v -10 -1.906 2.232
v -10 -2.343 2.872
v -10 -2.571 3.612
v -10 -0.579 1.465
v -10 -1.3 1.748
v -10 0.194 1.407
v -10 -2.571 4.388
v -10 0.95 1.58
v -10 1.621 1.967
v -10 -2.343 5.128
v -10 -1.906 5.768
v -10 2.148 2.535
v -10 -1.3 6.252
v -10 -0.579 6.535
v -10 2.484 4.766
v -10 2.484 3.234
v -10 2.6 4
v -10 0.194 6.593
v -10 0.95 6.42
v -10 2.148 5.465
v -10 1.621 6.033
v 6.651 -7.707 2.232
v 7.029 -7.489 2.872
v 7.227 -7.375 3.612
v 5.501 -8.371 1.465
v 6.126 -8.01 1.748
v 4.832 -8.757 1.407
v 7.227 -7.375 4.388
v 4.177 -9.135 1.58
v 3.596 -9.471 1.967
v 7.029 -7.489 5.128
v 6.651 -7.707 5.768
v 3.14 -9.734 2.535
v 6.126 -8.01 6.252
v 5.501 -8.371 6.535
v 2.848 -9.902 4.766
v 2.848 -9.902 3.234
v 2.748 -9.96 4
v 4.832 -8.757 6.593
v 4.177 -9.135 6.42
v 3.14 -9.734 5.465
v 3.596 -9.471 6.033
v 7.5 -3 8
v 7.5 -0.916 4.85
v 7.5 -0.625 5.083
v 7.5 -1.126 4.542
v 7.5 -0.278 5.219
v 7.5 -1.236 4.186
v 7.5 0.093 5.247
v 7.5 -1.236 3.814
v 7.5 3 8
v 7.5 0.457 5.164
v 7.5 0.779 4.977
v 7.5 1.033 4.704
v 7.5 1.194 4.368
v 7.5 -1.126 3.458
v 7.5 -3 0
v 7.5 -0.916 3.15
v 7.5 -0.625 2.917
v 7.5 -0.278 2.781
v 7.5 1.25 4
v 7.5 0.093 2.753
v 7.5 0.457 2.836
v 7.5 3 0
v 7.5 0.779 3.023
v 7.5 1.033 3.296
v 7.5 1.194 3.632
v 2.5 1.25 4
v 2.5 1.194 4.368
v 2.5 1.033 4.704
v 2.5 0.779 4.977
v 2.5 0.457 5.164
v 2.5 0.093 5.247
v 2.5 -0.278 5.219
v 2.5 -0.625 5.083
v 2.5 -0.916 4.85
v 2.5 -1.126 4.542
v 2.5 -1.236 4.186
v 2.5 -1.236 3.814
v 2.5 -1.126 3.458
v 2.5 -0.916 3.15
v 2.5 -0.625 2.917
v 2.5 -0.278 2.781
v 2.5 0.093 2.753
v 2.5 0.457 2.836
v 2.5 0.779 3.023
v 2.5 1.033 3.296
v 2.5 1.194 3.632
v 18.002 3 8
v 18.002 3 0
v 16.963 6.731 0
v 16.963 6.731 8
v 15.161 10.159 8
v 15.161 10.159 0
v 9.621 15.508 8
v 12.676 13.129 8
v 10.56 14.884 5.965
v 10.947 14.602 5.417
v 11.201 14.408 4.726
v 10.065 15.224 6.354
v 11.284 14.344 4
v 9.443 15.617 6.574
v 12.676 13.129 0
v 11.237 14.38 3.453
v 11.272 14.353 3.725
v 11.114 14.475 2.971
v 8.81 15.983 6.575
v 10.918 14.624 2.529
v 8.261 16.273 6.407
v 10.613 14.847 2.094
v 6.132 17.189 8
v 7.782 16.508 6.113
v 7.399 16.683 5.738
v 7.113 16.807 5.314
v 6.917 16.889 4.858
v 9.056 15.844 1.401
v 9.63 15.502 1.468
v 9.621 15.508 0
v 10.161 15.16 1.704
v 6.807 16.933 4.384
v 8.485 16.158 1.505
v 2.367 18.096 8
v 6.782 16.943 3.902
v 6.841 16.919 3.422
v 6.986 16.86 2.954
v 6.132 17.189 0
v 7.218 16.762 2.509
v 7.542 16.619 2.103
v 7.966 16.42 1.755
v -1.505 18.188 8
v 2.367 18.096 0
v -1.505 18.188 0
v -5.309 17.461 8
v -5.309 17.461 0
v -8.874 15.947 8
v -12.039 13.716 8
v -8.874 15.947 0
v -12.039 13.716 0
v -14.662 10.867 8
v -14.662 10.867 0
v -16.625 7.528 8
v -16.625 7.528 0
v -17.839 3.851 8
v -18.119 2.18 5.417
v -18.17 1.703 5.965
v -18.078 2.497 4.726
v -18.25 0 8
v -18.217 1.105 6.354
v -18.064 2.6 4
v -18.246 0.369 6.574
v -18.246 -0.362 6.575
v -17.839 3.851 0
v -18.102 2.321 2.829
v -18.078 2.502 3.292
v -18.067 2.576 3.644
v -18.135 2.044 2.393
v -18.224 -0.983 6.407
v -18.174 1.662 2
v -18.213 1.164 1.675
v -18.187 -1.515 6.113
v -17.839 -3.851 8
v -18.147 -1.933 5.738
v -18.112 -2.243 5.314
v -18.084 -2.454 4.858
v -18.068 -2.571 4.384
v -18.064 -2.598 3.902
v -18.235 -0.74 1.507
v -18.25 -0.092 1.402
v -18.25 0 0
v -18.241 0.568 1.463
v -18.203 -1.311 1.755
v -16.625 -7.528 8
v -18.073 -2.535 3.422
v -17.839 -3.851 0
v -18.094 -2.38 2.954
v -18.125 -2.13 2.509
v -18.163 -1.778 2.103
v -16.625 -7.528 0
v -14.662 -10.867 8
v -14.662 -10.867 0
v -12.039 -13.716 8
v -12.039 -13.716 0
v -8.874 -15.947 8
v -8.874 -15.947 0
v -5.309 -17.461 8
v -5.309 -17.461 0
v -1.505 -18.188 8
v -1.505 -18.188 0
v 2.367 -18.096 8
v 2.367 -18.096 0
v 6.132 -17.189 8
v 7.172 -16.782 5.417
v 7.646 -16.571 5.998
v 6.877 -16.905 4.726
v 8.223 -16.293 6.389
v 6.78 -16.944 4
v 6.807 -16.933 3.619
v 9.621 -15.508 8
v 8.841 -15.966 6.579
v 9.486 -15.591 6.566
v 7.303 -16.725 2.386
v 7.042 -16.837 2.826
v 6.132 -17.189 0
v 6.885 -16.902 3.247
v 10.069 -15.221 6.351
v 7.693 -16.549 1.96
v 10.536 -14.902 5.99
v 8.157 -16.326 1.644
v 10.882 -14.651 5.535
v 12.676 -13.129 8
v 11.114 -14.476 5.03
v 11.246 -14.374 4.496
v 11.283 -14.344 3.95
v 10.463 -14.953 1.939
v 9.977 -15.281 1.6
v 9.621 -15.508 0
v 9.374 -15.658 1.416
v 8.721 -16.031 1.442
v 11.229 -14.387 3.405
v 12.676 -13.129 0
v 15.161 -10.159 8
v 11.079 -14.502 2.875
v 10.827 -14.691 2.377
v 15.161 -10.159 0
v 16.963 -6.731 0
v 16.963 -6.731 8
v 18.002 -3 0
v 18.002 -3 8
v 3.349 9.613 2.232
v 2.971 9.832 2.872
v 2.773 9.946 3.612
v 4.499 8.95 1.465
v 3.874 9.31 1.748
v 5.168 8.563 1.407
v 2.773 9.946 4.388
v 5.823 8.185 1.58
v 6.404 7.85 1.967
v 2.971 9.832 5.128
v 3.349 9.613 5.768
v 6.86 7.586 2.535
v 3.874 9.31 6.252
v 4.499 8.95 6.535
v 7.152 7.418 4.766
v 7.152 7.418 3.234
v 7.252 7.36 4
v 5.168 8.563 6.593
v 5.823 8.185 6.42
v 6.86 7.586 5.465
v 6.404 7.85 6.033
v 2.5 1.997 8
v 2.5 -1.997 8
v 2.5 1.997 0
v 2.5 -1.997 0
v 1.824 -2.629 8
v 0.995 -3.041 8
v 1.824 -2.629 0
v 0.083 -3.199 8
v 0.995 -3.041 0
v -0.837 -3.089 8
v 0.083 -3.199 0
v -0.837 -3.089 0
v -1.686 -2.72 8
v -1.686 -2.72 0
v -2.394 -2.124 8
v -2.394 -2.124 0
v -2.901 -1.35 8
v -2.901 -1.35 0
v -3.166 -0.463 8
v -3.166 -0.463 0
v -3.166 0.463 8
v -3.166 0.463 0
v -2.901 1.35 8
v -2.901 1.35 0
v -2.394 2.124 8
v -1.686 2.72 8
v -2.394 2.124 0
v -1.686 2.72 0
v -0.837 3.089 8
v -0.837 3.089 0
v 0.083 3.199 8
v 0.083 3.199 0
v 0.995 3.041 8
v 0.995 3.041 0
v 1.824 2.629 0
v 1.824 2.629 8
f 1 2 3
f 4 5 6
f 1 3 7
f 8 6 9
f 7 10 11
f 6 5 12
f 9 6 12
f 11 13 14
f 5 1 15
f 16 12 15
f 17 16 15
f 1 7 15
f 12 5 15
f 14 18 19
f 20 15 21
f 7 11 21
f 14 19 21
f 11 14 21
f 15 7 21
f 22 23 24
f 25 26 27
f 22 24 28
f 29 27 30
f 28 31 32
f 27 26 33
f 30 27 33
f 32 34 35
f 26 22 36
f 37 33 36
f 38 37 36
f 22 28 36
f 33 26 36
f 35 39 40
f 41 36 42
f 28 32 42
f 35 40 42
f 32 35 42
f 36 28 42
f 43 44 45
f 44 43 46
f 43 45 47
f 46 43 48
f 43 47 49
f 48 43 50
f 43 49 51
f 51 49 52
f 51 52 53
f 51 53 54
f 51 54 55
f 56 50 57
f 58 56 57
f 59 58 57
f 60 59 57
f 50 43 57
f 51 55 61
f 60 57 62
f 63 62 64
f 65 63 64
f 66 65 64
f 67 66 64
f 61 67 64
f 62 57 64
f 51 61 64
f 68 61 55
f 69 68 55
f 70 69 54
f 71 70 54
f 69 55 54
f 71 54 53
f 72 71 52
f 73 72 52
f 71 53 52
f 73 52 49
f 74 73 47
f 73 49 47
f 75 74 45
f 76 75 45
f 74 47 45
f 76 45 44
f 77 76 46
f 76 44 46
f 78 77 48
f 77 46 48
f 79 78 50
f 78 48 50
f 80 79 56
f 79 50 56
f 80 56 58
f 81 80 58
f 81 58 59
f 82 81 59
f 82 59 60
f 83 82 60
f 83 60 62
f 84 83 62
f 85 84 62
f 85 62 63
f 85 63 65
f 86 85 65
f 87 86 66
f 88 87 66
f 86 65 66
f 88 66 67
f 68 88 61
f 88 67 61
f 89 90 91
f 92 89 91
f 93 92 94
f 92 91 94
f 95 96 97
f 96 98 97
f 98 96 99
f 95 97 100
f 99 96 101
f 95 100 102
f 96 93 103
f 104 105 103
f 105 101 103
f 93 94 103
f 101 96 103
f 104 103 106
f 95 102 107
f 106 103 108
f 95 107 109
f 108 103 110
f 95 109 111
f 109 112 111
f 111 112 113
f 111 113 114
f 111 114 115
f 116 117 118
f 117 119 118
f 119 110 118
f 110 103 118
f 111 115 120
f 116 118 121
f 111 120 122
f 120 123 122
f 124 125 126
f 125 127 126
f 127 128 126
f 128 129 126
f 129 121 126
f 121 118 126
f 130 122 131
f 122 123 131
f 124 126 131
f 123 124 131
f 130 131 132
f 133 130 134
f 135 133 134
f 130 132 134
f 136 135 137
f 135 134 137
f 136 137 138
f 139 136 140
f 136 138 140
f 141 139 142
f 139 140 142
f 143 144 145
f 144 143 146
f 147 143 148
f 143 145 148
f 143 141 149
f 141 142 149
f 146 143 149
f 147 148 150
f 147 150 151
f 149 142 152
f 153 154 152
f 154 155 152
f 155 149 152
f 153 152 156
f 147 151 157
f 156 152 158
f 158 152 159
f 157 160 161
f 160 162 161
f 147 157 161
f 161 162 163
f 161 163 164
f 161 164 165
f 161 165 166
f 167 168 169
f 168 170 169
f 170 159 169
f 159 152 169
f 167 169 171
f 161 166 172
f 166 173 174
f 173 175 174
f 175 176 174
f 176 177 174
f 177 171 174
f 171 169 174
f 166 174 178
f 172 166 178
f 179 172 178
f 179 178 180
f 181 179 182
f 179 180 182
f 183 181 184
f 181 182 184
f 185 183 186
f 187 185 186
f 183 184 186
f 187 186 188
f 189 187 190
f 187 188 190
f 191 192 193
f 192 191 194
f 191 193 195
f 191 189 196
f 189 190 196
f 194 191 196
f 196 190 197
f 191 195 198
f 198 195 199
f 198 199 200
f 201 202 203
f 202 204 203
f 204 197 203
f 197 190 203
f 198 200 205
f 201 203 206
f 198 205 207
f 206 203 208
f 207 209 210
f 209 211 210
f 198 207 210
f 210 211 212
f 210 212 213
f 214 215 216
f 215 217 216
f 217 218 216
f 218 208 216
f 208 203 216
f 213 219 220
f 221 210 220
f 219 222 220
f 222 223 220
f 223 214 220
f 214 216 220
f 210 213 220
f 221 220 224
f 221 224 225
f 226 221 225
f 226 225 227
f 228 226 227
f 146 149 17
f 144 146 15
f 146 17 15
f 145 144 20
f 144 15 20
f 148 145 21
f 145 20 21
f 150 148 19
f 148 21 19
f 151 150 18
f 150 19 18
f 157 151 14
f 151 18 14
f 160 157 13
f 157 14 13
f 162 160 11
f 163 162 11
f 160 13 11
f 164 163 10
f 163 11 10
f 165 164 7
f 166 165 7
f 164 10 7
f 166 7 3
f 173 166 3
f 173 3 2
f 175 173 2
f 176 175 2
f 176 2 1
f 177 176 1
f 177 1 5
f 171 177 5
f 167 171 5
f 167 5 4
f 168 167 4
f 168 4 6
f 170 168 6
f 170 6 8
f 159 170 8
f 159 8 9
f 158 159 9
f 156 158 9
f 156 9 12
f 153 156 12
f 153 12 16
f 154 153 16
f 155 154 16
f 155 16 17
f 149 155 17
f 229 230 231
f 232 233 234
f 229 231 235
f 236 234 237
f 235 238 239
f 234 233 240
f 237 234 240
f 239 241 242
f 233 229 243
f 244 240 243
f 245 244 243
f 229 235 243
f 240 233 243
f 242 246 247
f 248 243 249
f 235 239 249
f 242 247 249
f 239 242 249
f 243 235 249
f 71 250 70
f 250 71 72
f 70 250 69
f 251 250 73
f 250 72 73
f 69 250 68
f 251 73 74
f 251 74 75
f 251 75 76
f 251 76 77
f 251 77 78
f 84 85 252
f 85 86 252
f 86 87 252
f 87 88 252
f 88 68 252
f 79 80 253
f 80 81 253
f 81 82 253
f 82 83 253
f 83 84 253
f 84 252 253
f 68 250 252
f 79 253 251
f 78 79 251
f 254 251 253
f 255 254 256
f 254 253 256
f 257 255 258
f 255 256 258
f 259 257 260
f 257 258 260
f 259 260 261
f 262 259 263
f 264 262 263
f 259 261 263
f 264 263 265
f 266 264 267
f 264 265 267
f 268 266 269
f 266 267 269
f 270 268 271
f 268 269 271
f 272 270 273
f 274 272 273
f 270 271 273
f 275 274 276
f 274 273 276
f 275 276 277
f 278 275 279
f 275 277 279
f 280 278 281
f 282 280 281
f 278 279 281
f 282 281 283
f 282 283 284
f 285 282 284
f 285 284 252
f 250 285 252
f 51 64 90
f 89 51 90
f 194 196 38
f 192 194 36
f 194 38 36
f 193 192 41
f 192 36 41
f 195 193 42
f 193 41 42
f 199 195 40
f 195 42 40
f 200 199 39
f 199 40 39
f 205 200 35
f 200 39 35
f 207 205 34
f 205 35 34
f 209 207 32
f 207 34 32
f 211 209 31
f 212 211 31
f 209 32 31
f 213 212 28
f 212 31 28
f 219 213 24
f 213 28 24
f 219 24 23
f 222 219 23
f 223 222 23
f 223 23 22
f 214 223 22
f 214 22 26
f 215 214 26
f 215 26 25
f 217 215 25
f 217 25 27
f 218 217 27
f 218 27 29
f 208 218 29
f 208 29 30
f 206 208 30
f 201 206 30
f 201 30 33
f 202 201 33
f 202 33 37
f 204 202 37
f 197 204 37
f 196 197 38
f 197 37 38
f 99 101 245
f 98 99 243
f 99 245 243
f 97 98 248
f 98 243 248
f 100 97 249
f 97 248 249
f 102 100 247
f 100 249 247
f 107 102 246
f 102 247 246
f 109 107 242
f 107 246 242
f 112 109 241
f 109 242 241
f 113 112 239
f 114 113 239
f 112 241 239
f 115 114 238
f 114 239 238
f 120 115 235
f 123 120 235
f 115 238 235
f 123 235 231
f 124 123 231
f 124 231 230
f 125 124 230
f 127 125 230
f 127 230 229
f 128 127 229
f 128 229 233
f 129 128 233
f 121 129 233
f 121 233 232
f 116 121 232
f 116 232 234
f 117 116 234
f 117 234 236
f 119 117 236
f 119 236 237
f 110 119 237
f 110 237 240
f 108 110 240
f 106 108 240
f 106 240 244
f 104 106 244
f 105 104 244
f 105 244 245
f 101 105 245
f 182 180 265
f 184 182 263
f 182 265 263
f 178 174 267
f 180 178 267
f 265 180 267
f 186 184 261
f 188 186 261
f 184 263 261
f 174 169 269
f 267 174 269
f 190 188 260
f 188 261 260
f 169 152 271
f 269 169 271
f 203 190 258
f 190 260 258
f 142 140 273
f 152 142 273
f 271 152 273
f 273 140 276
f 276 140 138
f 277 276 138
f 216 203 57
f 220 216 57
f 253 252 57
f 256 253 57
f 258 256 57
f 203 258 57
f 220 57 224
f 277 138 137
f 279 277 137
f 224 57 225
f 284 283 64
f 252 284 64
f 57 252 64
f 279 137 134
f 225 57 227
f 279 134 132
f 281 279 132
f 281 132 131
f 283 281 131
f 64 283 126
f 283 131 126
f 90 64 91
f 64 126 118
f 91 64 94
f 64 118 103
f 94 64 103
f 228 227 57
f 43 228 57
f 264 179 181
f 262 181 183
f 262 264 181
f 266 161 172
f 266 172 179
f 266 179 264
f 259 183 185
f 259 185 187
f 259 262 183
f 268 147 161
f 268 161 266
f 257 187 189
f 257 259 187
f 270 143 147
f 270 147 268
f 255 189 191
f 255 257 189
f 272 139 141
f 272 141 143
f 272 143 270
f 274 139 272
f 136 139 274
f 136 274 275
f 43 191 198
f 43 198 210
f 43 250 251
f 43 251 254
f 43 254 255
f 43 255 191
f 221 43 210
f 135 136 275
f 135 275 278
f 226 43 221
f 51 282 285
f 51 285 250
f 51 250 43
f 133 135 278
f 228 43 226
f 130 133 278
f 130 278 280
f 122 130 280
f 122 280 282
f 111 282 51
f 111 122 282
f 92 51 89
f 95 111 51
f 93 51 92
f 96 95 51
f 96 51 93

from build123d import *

# Parameters (mm, degrees)
F1_DEPTH = 8
F2_R     = 1.25
F3_DEPTH = 5
F5_R     = 2.6
F6_DEPTH = 25
F7_COUNT = 3
F7_ANGLE = 240


with BuildPart() as f1:
    # F0 (on Top) → F1 (new body)
    with BuildSketch(Plane.XY):
        with BuildLine():
            Line((7.5, 3), (18.001736, 3))
            ThreePointArc((18.001736, 3), (-18.25, 0), (18.001736, -3))
            Line((18.001736, -3), (7.5, -3))
            Line((7.5, -3), (7.5, 0))
            Line((7.5, 0), (7.5, 3))
        make_face()
        with BuildLine():
            ThreePointArc((2.5, -1.997498), (-3.2, 0), (2.5, 1.997498))
            Line((2.5, 1.997498), (2.5, -1.997498))
        make_face(mode=Mode.SUBTRACT)
    extrude(amount=F1_DEPTH)

    # F2 (on face) → F3 (cut, through all)
    with BuildSketch(Plane.YZ.offset(7.5)):
        with Locations((0, 4)):
            Circle(F2_R)
    extrude(amount=-F3_DEPTH, mode=Mode.SUBTRACT)


with BuildPart() as f6:
    # F5 (on offset) → F6 (new body)
    with BuildSketch(Plane.YZ.offset(-10)):
        with Locations((0, 4)):
            Circle(F5_R)
    extrude(amount=-F6_DEPTH)


with BuildPart() as f7_1:
    # F7: instance of F6
    add(f6.part.rotate(Axis((0, 0, 0), (0, 0, -1)), 1 * F7_ANGLE / (F7_COUNT - 1)))


with BuildPart() as f7_2:
    # F7: instance of F6
    add(f6.part.rotate(Axis((0, 0, 0), (0, 0, -1)), 2 * F7_ANGLE / (F7_COUNT - 1)))


with BuildPart() as f1_1:
    add(f1.part)

    # F8: cut F6, F7_1, F7_2
    add(f6.part, mode=Mode.SUBTRACT)
    add(f7_1.part, mode=Mode.SUBTRACT)
    add(f7_2.part, mode=Mode.SUBTRACT)


solid = f1_1.part
